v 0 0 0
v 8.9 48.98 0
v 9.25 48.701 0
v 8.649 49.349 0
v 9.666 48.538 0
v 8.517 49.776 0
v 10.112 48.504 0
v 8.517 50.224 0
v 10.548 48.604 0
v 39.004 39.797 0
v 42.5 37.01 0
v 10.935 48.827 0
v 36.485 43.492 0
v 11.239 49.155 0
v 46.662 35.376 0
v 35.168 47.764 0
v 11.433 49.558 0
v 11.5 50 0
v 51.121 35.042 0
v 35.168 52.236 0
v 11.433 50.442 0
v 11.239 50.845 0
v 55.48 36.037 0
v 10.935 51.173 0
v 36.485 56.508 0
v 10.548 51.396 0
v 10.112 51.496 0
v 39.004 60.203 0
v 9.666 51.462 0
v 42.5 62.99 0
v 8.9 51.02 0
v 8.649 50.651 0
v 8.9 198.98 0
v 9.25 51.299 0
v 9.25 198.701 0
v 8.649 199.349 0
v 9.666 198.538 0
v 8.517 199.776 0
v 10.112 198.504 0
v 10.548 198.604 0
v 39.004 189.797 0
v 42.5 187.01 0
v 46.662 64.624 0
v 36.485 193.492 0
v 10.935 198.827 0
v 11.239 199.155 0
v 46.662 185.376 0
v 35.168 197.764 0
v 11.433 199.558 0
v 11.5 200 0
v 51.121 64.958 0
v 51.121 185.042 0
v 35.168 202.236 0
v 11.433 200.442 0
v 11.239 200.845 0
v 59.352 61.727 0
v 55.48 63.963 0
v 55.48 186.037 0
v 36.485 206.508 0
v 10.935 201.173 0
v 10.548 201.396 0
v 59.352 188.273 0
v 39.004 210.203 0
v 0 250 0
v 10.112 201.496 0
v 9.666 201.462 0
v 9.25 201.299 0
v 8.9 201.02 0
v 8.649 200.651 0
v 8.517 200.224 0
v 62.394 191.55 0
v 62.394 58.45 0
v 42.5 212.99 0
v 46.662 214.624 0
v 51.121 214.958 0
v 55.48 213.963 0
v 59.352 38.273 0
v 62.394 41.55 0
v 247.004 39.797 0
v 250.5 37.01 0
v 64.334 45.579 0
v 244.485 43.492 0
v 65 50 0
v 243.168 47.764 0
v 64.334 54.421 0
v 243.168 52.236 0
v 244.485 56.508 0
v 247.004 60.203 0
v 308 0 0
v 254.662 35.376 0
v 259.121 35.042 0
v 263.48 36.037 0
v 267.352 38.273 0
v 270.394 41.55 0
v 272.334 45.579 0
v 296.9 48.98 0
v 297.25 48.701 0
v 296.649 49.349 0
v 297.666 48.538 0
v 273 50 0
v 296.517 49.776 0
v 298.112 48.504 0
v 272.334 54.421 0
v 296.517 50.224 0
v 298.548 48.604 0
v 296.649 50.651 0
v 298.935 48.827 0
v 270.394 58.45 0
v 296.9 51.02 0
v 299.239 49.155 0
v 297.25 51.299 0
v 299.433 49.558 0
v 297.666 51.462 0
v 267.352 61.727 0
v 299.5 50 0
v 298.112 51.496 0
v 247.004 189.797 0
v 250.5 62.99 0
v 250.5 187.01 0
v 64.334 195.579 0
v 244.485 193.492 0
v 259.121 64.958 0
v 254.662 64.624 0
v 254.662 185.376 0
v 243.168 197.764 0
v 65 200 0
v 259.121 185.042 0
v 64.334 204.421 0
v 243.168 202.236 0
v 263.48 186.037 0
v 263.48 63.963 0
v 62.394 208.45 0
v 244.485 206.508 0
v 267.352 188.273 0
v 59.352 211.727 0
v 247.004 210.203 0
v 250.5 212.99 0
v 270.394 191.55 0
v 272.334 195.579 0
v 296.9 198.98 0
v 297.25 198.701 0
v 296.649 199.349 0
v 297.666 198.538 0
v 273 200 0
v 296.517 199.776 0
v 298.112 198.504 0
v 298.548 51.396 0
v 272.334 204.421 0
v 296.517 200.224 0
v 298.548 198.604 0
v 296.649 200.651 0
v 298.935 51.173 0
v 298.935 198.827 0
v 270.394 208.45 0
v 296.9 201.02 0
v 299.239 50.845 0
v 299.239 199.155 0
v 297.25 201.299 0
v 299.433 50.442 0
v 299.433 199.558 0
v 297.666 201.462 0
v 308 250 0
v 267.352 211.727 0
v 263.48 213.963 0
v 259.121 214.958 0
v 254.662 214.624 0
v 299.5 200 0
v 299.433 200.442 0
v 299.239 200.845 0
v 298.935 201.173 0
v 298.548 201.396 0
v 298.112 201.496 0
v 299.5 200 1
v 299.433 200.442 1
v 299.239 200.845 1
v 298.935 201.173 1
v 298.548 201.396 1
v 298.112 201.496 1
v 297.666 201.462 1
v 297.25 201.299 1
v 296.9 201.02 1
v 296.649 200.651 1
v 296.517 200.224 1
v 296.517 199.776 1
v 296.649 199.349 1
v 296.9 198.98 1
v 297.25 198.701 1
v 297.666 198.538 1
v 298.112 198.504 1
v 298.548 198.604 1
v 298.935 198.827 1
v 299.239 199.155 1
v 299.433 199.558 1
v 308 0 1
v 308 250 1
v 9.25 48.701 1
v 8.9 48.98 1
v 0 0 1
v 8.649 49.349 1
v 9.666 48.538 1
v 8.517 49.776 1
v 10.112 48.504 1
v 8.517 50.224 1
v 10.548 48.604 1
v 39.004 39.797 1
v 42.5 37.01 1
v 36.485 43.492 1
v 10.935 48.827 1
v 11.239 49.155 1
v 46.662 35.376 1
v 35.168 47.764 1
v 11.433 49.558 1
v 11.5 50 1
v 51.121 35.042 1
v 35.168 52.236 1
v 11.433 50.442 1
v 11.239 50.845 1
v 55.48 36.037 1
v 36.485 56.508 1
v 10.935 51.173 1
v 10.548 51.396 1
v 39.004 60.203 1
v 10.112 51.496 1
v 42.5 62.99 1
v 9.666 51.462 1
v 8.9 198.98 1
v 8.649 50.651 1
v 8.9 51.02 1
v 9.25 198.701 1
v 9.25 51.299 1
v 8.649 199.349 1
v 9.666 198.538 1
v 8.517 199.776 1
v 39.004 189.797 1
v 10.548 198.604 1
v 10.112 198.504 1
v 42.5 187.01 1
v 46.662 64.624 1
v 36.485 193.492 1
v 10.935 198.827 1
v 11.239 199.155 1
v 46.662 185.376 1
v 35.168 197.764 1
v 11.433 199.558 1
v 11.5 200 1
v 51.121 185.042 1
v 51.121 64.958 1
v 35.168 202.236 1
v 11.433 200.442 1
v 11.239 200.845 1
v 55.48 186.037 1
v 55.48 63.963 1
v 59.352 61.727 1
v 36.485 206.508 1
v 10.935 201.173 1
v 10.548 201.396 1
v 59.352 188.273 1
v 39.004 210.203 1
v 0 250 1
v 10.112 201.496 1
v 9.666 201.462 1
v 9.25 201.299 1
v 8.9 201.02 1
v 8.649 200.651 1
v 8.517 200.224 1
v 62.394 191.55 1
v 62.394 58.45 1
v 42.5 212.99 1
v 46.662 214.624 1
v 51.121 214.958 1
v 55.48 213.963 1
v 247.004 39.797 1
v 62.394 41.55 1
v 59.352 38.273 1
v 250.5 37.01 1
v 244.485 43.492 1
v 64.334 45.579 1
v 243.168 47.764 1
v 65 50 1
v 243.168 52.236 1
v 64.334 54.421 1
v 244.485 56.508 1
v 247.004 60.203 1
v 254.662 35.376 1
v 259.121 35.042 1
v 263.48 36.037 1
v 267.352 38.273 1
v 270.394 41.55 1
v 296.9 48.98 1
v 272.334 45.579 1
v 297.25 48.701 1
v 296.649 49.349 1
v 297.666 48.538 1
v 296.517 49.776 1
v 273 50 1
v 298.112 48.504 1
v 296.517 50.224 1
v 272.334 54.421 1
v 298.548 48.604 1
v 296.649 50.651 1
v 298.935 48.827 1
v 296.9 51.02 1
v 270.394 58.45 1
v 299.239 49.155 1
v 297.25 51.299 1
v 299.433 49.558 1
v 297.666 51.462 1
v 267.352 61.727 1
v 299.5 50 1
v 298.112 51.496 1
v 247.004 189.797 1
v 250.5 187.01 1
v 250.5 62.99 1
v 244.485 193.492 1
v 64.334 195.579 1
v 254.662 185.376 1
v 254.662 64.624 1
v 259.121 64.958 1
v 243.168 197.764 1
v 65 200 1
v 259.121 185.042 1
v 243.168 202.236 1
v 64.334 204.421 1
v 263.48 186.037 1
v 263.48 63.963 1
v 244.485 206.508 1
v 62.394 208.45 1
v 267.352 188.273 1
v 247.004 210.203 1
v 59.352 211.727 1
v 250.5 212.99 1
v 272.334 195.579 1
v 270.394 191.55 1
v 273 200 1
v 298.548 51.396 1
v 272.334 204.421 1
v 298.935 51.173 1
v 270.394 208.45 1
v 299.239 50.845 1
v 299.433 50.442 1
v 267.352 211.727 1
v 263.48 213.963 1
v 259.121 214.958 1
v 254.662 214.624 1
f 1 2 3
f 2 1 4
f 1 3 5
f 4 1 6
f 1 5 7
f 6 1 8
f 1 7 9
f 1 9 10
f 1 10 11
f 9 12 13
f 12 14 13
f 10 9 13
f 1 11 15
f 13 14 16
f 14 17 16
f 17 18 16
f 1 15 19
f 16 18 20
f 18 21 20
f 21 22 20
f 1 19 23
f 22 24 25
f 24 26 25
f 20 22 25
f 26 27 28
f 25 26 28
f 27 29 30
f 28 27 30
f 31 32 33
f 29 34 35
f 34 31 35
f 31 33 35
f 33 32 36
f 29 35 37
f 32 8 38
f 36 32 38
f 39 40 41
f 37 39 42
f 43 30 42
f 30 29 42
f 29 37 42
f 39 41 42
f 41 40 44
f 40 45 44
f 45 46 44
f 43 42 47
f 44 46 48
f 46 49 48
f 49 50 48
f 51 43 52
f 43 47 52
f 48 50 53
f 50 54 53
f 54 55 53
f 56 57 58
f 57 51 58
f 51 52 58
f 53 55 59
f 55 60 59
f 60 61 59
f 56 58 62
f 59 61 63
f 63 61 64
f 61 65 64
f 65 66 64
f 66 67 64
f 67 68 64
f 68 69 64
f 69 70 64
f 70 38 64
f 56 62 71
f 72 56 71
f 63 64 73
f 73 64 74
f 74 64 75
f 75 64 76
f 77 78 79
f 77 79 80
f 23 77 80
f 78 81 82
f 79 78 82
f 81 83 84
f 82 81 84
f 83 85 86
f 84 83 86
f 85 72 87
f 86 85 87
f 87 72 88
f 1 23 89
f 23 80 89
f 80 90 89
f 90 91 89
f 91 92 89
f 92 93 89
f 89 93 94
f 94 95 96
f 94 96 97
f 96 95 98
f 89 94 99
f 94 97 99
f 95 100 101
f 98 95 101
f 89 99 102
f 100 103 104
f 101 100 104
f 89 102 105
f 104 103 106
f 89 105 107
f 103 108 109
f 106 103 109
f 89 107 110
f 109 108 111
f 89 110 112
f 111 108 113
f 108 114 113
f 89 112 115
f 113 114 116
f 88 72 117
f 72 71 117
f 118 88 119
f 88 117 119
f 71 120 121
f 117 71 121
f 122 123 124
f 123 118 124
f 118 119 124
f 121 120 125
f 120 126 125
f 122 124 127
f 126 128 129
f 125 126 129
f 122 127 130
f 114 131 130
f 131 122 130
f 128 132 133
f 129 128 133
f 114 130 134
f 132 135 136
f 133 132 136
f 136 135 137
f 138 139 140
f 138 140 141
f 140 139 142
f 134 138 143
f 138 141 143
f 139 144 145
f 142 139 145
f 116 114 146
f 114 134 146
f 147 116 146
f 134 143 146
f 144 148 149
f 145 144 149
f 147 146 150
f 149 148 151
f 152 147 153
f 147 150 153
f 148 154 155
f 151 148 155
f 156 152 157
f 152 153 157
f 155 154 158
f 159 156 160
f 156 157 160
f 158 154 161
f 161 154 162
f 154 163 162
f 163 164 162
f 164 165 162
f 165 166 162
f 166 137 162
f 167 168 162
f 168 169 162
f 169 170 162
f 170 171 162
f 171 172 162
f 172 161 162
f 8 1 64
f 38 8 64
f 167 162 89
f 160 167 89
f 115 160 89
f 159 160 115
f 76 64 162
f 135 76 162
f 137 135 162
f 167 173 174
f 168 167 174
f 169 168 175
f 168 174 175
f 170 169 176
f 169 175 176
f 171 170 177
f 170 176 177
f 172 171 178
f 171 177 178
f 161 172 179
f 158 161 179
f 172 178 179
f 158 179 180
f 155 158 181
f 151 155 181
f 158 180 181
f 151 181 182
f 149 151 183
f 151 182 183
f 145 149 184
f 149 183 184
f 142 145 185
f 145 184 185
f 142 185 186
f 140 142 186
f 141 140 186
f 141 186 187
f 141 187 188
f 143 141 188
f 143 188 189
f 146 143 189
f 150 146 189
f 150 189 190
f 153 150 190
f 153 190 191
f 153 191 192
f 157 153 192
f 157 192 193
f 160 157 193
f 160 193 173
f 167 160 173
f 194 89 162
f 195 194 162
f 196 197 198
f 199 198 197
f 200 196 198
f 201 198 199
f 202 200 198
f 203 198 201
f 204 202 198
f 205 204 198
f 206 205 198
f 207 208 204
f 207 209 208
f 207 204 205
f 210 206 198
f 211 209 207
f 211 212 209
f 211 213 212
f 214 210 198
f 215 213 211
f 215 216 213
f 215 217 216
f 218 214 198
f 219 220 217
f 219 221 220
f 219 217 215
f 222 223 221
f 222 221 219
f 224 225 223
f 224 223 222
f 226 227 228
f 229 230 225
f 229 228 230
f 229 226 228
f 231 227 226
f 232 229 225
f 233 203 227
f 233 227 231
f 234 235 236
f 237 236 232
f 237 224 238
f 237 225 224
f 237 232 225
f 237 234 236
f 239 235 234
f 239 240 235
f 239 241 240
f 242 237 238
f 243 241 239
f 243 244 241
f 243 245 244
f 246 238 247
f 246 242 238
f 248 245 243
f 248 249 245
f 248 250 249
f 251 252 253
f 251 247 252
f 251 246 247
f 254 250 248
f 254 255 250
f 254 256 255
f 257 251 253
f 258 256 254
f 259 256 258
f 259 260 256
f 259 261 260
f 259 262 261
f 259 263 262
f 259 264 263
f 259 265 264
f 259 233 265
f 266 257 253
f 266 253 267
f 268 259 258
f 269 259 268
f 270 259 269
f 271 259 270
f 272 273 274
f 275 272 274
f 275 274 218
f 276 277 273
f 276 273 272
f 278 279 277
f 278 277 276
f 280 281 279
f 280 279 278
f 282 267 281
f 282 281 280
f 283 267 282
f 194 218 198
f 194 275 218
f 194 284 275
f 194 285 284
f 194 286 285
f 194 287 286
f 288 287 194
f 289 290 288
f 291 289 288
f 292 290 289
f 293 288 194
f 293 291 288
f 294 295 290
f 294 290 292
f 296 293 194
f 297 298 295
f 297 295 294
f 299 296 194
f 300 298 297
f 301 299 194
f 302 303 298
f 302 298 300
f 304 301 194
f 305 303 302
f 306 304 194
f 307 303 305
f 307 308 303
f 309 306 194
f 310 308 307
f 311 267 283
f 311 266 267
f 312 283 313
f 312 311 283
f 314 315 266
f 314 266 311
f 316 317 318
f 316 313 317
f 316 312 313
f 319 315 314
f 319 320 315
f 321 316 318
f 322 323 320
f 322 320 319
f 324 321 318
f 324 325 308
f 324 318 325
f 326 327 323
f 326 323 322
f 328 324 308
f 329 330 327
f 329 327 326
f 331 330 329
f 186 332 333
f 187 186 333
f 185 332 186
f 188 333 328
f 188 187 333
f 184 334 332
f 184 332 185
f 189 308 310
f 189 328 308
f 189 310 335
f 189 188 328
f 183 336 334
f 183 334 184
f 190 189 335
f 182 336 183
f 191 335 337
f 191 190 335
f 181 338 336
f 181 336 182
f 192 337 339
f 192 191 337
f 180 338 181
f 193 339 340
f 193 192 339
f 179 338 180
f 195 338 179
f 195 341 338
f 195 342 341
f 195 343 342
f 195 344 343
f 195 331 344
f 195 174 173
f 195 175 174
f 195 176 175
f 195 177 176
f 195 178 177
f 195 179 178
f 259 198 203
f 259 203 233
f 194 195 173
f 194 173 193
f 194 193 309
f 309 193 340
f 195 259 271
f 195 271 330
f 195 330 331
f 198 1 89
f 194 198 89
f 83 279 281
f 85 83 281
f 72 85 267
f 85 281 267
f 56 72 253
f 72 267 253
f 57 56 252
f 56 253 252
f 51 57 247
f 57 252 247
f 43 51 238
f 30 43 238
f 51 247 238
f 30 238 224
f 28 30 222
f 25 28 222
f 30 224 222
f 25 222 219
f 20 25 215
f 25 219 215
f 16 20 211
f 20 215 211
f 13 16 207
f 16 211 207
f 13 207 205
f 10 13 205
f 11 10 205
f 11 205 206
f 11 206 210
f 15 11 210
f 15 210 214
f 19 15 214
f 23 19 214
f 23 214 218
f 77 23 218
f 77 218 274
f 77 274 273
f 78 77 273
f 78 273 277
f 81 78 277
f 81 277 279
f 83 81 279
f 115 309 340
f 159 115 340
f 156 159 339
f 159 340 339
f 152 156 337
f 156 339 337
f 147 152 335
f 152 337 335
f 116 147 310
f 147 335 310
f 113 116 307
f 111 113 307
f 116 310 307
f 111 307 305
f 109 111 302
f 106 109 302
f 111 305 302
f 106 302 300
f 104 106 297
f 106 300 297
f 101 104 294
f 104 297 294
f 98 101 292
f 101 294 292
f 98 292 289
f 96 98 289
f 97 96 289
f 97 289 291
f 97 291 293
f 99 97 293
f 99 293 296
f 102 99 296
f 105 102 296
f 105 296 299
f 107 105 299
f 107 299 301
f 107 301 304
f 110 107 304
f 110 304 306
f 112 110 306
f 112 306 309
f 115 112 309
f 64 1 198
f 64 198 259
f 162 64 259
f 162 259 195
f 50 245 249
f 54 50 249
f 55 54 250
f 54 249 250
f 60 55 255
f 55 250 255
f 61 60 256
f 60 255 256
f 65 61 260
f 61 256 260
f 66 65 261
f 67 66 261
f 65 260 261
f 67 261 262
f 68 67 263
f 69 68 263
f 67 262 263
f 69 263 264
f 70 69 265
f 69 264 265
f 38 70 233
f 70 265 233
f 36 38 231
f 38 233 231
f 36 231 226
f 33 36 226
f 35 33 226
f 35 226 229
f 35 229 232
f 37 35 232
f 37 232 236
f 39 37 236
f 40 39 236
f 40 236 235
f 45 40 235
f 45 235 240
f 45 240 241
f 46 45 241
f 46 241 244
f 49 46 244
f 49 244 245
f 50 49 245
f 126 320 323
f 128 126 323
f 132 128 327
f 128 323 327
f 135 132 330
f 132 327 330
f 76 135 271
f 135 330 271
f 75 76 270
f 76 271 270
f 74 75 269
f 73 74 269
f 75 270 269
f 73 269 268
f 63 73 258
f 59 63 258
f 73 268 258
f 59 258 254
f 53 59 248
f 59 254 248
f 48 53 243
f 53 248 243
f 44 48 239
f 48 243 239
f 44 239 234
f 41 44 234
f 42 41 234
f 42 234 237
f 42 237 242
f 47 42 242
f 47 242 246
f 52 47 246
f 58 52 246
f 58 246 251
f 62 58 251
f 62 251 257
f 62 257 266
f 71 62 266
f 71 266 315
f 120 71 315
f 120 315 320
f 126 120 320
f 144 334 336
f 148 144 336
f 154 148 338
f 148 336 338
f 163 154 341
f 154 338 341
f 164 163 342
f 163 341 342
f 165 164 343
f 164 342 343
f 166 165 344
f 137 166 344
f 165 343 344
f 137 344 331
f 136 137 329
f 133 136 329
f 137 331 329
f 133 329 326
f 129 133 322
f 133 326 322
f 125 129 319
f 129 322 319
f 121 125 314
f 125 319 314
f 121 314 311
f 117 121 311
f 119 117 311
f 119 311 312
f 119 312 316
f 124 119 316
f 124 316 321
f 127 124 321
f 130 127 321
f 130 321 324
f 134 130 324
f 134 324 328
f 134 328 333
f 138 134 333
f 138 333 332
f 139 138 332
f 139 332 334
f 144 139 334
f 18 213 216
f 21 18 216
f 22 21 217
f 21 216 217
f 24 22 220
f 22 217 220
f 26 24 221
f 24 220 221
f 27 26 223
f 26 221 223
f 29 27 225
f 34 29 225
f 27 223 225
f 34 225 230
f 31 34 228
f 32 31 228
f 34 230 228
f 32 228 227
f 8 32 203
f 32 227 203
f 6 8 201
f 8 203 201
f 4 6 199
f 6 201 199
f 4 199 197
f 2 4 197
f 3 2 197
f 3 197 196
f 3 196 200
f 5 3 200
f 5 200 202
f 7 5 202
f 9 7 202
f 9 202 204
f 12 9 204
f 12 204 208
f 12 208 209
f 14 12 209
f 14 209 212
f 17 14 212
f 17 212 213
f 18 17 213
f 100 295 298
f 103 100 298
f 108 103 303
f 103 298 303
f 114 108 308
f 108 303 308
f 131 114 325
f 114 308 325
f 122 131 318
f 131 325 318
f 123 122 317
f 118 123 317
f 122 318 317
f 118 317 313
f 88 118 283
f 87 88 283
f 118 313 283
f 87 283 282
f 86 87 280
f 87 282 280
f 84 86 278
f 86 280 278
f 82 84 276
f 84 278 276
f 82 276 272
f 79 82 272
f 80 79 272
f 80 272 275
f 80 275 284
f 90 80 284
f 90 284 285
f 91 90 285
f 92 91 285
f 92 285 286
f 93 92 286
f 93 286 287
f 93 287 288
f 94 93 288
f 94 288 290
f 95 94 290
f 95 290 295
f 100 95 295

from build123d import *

# Parameters (mm, degrees)
ESQUISSE2_W                = 308
ESQUISSE2_H                = 250
BOSS_EXTRU_1_DEPTH         = 1
ESQUISSE3_R                = 1.5
ENL_V_MAT_EXTRU_1_DEPTH    = 397.692576185
R_P_TITION_LIN_AIRE1_COUNT = 2
R_P_TITION_LIN_AIRE1_PITCH = 150
ESQUISSE4_R                = 15
ENL_V_MAT_EXTRU_2_DEPTH    = 397.692576185


with BuildPart() as part:
    # Esquisse2 → Boss.-Extru.1 (new body)
    with BuildSketch(Plane.XY):
        with Locations((154, 125)):
            Rectangle(ESQUISSE2_W, ESQUISSE2_H)
    extrude(amount=BOSS_EXTRU_1_DEPTH)

    # Esquisse3 → Enlèv. mat.-Extru.1 (cut, through all)
    with BuildSketch(Plane.XY.offset(1)):
        with Locations((10, 200)):
            Circle(ESQUISSE3_R)
        with Locations((298, 200)):
            Circle(ESQUISSE3_R)
    enl_v_mat_extru_1 = extrude(amount=-ENL_V_MAT_EXTRU_1_DEPTH, mode=Mode.SUBTRACT)

    # Répétition linéaire1: Enlèv. mat.-Extru.1 ×2
    with Locations(*[(0, -i * R_P_TITION_LIN_AIRE1_PITCH, 0) for i in range(1, R_P_TITION_LIN_AIRE1_COUNT)]):
        add(enl_v_mat_extru_1, mode=Mode.SUBTRACT)

    # Esquisse4 → Enlèv. mat.-Extru.2 (cut, through all)
    with BuildSketch(Plane.XY.offset(1)):
        with Locations((50, 200)):
            Circle(ESQUISSE4_R)
        with Locations((258, 200)):
            Circle(ESQUISSE4_R)
        with Locations((50, 50)):
            Circle(ESQUISSE4_R)
        with Locations((258, 50)):
            Circle(ESQUISSE4_R)
    extrude(amount=-ENL_V_MAT_EXTRU_2_DEPTH, mode=Mode.SUBTRACT)


solid = part.part
